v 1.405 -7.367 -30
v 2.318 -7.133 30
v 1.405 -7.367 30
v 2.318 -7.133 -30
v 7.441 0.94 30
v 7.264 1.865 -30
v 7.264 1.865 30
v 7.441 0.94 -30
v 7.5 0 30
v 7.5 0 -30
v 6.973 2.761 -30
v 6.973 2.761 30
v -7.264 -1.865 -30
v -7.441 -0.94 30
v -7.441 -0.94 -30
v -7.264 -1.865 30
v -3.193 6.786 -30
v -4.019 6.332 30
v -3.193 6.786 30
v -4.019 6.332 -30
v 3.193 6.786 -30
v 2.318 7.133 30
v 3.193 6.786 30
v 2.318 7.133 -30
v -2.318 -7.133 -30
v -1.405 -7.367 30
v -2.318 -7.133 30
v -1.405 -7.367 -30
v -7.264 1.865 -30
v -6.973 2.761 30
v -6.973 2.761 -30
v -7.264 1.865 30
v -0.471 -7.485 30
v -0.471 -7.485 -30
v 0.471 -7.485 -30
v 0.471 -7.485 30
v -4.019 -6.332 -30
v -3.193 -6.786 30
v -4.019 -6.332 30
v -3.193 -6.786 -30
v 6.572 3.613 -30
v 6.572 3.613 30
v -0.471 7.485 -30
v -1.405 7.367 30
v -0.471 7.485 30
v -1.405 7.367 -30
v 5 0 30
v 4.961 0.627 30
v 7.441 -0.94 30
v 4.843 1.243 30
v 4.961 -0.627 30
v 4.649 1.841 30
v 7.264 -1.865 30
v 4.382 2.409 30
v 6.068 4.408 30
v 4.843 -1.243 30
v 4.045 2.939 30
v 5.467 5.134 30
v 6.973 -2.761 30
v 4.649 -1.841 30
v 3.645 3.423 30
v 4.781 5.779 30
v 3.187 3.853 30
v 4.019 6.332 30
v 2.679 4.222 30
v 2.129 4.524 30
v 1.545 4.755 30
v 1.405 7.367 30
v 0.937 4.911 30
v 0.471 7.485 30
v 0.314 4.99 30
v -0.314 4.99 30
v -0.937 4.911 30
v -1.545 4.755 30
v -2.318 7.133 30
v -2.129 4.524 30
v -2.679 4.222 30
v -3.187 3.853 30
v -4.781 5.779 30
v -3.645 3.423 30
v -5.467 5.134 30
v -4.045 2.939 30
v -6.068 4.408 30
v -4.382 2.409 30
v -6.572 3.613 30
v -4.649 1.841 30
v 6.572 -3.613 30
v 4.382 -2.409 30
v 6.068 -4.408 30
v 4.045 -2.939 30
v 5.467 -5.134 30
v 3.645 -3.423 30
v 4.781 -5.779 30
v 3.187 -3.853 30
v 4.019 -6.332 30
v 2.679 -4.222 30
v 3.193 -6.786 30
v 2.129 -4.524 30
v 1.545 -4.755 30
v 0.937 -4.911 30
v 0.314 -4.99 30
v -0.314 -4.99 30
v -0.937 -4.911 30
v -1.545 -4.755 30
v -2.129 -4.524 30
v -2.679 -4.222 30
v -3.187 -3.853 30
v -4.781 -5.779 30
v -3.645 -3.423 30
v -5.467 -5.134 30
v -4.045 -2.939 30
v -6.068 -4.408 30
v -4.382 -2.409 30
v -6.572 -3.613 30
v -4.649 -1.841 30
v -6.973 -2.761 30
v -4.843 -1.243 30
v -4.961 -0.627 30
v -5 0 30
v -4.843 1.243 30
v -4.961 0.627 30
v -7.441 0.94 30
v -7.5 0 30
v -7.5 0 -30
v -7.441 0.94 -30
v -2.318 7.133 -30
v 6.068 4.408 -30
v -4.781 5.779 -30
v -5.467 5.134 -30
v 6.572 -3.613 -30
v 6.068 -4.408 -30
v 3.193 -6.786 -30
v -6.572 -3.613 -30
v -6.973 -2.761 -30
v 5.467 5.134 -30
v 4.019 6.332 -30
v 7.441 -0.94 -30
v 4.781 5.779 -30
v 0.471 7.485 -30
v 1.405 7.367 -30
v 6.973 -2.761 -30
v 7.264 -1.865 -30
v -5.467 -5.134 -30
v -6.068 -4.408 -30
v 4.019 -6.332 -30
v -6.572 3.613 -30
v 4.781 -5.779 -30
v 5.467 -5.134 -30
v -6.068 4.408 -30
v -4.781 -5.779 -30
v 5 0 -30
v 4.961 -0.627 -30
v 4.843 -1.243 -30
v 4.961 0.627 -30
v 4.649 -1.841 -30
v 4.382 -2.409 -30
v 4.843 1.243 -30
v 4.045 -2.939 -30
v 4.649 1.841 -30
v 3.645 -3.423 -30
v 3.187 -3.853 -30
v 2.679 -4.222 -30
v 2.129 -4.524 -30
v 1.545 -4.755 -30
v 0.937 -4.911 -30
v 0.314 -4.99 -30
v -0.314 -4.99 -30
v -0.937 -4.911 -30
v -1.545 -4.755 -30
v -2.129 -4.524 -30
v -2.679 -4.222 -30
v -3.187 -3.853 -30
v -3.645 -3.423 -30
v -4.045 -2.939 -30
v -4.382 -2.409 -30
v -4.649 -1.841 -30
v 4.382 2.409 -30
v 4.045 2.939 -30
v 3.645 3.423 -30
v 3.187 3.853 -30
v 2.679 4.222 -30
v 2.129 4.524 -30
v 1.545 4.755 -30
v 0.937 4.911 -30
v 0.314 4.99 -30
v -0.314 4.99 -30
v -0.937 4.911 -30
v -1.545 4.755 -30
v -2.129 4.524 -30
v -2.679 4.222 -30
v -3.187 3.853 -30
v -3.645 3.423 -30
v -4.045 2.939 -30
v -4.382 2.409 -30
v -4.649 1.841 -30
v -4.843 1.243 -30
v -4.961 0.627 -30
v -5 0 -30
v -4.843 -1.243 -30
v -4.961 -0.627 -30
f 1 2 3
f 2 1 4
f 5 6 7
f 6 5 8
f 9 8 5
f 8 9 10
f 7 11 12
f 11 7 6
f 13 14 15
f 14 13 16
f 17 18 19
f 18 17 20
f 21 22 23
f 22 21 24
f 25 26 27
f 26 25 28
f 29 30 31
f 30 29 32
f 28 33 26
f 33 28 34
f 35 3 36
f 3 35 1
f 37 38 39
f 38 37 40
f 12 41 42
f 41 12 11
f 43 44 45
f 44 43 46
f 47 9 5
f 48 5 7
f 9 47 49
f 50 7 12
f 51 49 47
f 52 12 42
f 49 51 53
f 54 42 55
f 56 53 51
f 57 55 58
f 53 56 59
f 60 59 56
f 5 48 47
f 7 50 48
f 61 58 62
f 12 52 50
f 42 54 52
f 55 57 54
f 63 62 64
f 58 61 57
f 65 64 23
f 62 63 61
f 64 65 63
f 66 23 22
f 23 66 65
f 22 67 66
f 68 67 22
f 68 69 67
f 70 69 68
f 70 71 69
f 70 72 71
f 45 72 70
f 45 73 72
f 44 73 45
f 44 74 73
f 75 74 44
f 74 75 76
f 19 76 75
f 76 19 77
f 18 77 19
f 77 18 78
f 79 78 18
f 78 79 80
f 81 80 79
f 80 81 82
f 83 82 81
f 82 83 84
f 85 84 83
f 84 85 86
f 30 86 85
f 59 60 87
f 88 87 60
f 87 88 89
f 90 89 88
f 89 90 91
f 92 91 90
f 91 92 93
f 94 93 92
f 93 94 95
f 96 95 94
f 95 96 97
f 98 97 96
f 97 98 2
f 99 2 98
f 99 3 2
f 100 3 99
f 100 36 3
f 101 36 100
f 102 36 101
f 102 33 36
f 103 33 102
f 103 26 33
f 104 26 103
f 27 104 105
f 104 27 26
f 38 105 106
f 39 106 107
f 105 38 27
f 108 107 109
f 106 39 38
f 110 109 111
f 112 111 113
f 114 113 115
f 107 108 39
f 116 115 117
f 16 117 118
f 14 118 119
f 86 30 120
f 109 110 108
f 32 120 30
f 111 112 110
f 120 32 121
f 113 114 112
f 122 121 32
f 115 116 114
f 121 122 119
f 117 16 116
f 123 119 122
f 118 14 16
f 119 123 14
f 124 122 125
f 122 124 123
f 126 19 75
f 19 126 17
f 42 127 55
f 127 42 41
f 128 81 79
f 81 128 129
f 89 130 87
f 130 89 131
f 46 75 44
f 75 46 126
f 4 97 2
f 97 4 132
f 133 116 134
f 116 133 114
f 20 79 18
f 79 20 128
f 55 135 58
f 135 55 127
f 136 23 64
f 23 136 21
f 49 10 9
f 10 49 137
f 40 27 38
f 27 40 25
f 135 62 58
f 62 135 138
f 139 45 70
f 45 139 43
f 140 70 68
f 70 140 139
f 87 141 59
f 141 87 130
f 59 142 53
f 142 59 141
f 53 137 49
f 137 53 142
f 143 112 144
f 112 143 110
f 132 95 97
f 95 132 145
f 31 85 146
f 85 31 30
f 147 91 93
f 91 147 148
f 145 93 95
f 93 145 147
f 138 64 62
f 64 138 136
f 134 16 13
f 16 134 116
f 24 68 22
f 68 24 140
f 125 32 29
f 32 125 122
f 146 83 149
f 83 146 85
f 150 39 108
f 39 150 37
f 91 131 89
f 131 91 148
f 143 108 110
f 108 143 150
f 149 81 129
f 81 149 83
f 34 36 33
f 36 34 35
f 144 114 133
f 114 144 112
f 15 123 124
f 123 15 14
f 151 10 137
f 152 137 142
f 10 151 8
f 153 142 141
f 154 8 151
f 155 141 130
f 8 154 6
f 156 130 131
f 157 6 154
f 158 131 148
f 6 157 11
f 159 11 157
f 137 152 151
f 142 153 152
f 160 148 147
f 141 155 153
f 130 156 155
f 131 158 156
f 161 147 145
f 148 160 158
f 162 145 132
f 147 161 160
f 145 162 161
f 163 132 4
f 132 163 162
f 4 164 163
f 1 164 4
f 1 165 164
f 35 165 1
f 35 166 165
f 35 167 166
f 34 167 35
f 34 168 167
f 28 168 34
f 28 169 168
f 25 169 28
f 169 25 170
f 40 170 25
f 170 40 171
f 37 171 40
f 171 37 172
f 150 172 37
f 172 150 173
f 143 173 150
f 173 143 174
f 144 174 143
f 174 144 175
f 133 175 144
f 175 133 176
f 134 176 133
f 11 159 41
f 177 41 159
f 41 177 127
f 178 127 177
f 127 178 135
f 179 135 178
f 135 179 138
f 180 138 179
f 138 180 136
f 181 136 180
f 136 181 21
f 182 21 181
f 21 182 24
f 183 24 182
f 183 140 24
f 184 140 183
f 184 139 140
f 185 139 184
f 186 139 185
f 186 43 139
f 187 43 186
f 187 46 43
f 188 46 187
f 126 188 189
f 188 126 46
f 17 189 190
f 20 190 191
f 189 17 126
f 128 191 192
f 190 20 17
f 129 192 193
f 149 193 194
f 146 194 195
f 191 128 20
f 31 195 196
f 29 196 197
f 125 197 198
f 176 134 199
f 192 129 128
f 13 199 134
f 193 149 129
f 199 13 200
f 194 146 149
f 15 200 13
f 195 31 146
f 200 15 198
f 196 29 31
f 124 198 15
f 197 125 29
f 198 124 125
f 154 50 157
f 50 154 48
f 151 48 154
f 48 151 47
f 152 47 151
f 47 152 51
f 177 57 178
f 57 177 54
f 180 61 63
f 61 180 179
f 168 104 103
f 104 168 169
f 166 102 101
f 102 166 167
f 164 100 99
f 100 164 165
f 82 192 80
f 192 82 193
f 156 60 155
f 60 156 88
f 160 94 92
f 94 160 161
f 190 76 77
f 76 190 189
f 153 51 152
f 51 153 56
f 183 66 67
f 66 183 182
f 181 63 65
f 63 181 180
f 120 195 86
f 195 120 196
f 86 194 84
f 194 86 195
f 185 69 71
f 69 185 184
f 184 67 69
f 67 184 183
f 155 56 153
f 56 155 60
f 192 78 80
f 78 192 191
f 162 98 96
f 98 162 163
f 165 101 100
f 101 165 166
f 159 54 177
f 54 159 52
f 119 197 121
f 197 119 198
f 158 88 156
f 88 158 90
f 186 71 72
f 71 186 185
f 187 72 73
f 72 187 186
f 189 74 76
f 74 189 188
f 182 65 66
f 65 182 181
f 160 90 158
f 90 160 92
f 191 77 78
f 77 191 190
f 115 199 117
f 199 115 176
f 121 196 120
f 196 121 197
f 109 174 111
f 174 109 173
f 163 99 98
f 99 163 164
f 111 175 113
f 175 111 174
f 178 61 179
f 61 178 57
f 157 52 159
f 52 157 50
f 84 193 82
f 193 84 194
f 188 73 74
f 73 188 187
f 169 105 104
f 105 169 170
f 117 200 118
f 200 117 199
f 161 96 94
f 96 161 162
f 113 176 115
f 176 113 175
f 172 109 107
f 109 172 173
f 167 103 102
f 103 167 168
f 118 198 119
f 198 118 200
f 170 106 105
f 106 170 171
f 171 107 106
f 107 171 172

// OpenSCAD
$fn = 50;


difference() {
	union() {
		translate(v = [0, 0, -30.0000000000]) {
			cylinder(h = 60, r = 7.5000000000);
		}
	}
	union() {
		translate(v = [0, 0, -100.0000000000]) {
			cylinder(h = 200, r = 5.0000000000);
		}
	}
}
